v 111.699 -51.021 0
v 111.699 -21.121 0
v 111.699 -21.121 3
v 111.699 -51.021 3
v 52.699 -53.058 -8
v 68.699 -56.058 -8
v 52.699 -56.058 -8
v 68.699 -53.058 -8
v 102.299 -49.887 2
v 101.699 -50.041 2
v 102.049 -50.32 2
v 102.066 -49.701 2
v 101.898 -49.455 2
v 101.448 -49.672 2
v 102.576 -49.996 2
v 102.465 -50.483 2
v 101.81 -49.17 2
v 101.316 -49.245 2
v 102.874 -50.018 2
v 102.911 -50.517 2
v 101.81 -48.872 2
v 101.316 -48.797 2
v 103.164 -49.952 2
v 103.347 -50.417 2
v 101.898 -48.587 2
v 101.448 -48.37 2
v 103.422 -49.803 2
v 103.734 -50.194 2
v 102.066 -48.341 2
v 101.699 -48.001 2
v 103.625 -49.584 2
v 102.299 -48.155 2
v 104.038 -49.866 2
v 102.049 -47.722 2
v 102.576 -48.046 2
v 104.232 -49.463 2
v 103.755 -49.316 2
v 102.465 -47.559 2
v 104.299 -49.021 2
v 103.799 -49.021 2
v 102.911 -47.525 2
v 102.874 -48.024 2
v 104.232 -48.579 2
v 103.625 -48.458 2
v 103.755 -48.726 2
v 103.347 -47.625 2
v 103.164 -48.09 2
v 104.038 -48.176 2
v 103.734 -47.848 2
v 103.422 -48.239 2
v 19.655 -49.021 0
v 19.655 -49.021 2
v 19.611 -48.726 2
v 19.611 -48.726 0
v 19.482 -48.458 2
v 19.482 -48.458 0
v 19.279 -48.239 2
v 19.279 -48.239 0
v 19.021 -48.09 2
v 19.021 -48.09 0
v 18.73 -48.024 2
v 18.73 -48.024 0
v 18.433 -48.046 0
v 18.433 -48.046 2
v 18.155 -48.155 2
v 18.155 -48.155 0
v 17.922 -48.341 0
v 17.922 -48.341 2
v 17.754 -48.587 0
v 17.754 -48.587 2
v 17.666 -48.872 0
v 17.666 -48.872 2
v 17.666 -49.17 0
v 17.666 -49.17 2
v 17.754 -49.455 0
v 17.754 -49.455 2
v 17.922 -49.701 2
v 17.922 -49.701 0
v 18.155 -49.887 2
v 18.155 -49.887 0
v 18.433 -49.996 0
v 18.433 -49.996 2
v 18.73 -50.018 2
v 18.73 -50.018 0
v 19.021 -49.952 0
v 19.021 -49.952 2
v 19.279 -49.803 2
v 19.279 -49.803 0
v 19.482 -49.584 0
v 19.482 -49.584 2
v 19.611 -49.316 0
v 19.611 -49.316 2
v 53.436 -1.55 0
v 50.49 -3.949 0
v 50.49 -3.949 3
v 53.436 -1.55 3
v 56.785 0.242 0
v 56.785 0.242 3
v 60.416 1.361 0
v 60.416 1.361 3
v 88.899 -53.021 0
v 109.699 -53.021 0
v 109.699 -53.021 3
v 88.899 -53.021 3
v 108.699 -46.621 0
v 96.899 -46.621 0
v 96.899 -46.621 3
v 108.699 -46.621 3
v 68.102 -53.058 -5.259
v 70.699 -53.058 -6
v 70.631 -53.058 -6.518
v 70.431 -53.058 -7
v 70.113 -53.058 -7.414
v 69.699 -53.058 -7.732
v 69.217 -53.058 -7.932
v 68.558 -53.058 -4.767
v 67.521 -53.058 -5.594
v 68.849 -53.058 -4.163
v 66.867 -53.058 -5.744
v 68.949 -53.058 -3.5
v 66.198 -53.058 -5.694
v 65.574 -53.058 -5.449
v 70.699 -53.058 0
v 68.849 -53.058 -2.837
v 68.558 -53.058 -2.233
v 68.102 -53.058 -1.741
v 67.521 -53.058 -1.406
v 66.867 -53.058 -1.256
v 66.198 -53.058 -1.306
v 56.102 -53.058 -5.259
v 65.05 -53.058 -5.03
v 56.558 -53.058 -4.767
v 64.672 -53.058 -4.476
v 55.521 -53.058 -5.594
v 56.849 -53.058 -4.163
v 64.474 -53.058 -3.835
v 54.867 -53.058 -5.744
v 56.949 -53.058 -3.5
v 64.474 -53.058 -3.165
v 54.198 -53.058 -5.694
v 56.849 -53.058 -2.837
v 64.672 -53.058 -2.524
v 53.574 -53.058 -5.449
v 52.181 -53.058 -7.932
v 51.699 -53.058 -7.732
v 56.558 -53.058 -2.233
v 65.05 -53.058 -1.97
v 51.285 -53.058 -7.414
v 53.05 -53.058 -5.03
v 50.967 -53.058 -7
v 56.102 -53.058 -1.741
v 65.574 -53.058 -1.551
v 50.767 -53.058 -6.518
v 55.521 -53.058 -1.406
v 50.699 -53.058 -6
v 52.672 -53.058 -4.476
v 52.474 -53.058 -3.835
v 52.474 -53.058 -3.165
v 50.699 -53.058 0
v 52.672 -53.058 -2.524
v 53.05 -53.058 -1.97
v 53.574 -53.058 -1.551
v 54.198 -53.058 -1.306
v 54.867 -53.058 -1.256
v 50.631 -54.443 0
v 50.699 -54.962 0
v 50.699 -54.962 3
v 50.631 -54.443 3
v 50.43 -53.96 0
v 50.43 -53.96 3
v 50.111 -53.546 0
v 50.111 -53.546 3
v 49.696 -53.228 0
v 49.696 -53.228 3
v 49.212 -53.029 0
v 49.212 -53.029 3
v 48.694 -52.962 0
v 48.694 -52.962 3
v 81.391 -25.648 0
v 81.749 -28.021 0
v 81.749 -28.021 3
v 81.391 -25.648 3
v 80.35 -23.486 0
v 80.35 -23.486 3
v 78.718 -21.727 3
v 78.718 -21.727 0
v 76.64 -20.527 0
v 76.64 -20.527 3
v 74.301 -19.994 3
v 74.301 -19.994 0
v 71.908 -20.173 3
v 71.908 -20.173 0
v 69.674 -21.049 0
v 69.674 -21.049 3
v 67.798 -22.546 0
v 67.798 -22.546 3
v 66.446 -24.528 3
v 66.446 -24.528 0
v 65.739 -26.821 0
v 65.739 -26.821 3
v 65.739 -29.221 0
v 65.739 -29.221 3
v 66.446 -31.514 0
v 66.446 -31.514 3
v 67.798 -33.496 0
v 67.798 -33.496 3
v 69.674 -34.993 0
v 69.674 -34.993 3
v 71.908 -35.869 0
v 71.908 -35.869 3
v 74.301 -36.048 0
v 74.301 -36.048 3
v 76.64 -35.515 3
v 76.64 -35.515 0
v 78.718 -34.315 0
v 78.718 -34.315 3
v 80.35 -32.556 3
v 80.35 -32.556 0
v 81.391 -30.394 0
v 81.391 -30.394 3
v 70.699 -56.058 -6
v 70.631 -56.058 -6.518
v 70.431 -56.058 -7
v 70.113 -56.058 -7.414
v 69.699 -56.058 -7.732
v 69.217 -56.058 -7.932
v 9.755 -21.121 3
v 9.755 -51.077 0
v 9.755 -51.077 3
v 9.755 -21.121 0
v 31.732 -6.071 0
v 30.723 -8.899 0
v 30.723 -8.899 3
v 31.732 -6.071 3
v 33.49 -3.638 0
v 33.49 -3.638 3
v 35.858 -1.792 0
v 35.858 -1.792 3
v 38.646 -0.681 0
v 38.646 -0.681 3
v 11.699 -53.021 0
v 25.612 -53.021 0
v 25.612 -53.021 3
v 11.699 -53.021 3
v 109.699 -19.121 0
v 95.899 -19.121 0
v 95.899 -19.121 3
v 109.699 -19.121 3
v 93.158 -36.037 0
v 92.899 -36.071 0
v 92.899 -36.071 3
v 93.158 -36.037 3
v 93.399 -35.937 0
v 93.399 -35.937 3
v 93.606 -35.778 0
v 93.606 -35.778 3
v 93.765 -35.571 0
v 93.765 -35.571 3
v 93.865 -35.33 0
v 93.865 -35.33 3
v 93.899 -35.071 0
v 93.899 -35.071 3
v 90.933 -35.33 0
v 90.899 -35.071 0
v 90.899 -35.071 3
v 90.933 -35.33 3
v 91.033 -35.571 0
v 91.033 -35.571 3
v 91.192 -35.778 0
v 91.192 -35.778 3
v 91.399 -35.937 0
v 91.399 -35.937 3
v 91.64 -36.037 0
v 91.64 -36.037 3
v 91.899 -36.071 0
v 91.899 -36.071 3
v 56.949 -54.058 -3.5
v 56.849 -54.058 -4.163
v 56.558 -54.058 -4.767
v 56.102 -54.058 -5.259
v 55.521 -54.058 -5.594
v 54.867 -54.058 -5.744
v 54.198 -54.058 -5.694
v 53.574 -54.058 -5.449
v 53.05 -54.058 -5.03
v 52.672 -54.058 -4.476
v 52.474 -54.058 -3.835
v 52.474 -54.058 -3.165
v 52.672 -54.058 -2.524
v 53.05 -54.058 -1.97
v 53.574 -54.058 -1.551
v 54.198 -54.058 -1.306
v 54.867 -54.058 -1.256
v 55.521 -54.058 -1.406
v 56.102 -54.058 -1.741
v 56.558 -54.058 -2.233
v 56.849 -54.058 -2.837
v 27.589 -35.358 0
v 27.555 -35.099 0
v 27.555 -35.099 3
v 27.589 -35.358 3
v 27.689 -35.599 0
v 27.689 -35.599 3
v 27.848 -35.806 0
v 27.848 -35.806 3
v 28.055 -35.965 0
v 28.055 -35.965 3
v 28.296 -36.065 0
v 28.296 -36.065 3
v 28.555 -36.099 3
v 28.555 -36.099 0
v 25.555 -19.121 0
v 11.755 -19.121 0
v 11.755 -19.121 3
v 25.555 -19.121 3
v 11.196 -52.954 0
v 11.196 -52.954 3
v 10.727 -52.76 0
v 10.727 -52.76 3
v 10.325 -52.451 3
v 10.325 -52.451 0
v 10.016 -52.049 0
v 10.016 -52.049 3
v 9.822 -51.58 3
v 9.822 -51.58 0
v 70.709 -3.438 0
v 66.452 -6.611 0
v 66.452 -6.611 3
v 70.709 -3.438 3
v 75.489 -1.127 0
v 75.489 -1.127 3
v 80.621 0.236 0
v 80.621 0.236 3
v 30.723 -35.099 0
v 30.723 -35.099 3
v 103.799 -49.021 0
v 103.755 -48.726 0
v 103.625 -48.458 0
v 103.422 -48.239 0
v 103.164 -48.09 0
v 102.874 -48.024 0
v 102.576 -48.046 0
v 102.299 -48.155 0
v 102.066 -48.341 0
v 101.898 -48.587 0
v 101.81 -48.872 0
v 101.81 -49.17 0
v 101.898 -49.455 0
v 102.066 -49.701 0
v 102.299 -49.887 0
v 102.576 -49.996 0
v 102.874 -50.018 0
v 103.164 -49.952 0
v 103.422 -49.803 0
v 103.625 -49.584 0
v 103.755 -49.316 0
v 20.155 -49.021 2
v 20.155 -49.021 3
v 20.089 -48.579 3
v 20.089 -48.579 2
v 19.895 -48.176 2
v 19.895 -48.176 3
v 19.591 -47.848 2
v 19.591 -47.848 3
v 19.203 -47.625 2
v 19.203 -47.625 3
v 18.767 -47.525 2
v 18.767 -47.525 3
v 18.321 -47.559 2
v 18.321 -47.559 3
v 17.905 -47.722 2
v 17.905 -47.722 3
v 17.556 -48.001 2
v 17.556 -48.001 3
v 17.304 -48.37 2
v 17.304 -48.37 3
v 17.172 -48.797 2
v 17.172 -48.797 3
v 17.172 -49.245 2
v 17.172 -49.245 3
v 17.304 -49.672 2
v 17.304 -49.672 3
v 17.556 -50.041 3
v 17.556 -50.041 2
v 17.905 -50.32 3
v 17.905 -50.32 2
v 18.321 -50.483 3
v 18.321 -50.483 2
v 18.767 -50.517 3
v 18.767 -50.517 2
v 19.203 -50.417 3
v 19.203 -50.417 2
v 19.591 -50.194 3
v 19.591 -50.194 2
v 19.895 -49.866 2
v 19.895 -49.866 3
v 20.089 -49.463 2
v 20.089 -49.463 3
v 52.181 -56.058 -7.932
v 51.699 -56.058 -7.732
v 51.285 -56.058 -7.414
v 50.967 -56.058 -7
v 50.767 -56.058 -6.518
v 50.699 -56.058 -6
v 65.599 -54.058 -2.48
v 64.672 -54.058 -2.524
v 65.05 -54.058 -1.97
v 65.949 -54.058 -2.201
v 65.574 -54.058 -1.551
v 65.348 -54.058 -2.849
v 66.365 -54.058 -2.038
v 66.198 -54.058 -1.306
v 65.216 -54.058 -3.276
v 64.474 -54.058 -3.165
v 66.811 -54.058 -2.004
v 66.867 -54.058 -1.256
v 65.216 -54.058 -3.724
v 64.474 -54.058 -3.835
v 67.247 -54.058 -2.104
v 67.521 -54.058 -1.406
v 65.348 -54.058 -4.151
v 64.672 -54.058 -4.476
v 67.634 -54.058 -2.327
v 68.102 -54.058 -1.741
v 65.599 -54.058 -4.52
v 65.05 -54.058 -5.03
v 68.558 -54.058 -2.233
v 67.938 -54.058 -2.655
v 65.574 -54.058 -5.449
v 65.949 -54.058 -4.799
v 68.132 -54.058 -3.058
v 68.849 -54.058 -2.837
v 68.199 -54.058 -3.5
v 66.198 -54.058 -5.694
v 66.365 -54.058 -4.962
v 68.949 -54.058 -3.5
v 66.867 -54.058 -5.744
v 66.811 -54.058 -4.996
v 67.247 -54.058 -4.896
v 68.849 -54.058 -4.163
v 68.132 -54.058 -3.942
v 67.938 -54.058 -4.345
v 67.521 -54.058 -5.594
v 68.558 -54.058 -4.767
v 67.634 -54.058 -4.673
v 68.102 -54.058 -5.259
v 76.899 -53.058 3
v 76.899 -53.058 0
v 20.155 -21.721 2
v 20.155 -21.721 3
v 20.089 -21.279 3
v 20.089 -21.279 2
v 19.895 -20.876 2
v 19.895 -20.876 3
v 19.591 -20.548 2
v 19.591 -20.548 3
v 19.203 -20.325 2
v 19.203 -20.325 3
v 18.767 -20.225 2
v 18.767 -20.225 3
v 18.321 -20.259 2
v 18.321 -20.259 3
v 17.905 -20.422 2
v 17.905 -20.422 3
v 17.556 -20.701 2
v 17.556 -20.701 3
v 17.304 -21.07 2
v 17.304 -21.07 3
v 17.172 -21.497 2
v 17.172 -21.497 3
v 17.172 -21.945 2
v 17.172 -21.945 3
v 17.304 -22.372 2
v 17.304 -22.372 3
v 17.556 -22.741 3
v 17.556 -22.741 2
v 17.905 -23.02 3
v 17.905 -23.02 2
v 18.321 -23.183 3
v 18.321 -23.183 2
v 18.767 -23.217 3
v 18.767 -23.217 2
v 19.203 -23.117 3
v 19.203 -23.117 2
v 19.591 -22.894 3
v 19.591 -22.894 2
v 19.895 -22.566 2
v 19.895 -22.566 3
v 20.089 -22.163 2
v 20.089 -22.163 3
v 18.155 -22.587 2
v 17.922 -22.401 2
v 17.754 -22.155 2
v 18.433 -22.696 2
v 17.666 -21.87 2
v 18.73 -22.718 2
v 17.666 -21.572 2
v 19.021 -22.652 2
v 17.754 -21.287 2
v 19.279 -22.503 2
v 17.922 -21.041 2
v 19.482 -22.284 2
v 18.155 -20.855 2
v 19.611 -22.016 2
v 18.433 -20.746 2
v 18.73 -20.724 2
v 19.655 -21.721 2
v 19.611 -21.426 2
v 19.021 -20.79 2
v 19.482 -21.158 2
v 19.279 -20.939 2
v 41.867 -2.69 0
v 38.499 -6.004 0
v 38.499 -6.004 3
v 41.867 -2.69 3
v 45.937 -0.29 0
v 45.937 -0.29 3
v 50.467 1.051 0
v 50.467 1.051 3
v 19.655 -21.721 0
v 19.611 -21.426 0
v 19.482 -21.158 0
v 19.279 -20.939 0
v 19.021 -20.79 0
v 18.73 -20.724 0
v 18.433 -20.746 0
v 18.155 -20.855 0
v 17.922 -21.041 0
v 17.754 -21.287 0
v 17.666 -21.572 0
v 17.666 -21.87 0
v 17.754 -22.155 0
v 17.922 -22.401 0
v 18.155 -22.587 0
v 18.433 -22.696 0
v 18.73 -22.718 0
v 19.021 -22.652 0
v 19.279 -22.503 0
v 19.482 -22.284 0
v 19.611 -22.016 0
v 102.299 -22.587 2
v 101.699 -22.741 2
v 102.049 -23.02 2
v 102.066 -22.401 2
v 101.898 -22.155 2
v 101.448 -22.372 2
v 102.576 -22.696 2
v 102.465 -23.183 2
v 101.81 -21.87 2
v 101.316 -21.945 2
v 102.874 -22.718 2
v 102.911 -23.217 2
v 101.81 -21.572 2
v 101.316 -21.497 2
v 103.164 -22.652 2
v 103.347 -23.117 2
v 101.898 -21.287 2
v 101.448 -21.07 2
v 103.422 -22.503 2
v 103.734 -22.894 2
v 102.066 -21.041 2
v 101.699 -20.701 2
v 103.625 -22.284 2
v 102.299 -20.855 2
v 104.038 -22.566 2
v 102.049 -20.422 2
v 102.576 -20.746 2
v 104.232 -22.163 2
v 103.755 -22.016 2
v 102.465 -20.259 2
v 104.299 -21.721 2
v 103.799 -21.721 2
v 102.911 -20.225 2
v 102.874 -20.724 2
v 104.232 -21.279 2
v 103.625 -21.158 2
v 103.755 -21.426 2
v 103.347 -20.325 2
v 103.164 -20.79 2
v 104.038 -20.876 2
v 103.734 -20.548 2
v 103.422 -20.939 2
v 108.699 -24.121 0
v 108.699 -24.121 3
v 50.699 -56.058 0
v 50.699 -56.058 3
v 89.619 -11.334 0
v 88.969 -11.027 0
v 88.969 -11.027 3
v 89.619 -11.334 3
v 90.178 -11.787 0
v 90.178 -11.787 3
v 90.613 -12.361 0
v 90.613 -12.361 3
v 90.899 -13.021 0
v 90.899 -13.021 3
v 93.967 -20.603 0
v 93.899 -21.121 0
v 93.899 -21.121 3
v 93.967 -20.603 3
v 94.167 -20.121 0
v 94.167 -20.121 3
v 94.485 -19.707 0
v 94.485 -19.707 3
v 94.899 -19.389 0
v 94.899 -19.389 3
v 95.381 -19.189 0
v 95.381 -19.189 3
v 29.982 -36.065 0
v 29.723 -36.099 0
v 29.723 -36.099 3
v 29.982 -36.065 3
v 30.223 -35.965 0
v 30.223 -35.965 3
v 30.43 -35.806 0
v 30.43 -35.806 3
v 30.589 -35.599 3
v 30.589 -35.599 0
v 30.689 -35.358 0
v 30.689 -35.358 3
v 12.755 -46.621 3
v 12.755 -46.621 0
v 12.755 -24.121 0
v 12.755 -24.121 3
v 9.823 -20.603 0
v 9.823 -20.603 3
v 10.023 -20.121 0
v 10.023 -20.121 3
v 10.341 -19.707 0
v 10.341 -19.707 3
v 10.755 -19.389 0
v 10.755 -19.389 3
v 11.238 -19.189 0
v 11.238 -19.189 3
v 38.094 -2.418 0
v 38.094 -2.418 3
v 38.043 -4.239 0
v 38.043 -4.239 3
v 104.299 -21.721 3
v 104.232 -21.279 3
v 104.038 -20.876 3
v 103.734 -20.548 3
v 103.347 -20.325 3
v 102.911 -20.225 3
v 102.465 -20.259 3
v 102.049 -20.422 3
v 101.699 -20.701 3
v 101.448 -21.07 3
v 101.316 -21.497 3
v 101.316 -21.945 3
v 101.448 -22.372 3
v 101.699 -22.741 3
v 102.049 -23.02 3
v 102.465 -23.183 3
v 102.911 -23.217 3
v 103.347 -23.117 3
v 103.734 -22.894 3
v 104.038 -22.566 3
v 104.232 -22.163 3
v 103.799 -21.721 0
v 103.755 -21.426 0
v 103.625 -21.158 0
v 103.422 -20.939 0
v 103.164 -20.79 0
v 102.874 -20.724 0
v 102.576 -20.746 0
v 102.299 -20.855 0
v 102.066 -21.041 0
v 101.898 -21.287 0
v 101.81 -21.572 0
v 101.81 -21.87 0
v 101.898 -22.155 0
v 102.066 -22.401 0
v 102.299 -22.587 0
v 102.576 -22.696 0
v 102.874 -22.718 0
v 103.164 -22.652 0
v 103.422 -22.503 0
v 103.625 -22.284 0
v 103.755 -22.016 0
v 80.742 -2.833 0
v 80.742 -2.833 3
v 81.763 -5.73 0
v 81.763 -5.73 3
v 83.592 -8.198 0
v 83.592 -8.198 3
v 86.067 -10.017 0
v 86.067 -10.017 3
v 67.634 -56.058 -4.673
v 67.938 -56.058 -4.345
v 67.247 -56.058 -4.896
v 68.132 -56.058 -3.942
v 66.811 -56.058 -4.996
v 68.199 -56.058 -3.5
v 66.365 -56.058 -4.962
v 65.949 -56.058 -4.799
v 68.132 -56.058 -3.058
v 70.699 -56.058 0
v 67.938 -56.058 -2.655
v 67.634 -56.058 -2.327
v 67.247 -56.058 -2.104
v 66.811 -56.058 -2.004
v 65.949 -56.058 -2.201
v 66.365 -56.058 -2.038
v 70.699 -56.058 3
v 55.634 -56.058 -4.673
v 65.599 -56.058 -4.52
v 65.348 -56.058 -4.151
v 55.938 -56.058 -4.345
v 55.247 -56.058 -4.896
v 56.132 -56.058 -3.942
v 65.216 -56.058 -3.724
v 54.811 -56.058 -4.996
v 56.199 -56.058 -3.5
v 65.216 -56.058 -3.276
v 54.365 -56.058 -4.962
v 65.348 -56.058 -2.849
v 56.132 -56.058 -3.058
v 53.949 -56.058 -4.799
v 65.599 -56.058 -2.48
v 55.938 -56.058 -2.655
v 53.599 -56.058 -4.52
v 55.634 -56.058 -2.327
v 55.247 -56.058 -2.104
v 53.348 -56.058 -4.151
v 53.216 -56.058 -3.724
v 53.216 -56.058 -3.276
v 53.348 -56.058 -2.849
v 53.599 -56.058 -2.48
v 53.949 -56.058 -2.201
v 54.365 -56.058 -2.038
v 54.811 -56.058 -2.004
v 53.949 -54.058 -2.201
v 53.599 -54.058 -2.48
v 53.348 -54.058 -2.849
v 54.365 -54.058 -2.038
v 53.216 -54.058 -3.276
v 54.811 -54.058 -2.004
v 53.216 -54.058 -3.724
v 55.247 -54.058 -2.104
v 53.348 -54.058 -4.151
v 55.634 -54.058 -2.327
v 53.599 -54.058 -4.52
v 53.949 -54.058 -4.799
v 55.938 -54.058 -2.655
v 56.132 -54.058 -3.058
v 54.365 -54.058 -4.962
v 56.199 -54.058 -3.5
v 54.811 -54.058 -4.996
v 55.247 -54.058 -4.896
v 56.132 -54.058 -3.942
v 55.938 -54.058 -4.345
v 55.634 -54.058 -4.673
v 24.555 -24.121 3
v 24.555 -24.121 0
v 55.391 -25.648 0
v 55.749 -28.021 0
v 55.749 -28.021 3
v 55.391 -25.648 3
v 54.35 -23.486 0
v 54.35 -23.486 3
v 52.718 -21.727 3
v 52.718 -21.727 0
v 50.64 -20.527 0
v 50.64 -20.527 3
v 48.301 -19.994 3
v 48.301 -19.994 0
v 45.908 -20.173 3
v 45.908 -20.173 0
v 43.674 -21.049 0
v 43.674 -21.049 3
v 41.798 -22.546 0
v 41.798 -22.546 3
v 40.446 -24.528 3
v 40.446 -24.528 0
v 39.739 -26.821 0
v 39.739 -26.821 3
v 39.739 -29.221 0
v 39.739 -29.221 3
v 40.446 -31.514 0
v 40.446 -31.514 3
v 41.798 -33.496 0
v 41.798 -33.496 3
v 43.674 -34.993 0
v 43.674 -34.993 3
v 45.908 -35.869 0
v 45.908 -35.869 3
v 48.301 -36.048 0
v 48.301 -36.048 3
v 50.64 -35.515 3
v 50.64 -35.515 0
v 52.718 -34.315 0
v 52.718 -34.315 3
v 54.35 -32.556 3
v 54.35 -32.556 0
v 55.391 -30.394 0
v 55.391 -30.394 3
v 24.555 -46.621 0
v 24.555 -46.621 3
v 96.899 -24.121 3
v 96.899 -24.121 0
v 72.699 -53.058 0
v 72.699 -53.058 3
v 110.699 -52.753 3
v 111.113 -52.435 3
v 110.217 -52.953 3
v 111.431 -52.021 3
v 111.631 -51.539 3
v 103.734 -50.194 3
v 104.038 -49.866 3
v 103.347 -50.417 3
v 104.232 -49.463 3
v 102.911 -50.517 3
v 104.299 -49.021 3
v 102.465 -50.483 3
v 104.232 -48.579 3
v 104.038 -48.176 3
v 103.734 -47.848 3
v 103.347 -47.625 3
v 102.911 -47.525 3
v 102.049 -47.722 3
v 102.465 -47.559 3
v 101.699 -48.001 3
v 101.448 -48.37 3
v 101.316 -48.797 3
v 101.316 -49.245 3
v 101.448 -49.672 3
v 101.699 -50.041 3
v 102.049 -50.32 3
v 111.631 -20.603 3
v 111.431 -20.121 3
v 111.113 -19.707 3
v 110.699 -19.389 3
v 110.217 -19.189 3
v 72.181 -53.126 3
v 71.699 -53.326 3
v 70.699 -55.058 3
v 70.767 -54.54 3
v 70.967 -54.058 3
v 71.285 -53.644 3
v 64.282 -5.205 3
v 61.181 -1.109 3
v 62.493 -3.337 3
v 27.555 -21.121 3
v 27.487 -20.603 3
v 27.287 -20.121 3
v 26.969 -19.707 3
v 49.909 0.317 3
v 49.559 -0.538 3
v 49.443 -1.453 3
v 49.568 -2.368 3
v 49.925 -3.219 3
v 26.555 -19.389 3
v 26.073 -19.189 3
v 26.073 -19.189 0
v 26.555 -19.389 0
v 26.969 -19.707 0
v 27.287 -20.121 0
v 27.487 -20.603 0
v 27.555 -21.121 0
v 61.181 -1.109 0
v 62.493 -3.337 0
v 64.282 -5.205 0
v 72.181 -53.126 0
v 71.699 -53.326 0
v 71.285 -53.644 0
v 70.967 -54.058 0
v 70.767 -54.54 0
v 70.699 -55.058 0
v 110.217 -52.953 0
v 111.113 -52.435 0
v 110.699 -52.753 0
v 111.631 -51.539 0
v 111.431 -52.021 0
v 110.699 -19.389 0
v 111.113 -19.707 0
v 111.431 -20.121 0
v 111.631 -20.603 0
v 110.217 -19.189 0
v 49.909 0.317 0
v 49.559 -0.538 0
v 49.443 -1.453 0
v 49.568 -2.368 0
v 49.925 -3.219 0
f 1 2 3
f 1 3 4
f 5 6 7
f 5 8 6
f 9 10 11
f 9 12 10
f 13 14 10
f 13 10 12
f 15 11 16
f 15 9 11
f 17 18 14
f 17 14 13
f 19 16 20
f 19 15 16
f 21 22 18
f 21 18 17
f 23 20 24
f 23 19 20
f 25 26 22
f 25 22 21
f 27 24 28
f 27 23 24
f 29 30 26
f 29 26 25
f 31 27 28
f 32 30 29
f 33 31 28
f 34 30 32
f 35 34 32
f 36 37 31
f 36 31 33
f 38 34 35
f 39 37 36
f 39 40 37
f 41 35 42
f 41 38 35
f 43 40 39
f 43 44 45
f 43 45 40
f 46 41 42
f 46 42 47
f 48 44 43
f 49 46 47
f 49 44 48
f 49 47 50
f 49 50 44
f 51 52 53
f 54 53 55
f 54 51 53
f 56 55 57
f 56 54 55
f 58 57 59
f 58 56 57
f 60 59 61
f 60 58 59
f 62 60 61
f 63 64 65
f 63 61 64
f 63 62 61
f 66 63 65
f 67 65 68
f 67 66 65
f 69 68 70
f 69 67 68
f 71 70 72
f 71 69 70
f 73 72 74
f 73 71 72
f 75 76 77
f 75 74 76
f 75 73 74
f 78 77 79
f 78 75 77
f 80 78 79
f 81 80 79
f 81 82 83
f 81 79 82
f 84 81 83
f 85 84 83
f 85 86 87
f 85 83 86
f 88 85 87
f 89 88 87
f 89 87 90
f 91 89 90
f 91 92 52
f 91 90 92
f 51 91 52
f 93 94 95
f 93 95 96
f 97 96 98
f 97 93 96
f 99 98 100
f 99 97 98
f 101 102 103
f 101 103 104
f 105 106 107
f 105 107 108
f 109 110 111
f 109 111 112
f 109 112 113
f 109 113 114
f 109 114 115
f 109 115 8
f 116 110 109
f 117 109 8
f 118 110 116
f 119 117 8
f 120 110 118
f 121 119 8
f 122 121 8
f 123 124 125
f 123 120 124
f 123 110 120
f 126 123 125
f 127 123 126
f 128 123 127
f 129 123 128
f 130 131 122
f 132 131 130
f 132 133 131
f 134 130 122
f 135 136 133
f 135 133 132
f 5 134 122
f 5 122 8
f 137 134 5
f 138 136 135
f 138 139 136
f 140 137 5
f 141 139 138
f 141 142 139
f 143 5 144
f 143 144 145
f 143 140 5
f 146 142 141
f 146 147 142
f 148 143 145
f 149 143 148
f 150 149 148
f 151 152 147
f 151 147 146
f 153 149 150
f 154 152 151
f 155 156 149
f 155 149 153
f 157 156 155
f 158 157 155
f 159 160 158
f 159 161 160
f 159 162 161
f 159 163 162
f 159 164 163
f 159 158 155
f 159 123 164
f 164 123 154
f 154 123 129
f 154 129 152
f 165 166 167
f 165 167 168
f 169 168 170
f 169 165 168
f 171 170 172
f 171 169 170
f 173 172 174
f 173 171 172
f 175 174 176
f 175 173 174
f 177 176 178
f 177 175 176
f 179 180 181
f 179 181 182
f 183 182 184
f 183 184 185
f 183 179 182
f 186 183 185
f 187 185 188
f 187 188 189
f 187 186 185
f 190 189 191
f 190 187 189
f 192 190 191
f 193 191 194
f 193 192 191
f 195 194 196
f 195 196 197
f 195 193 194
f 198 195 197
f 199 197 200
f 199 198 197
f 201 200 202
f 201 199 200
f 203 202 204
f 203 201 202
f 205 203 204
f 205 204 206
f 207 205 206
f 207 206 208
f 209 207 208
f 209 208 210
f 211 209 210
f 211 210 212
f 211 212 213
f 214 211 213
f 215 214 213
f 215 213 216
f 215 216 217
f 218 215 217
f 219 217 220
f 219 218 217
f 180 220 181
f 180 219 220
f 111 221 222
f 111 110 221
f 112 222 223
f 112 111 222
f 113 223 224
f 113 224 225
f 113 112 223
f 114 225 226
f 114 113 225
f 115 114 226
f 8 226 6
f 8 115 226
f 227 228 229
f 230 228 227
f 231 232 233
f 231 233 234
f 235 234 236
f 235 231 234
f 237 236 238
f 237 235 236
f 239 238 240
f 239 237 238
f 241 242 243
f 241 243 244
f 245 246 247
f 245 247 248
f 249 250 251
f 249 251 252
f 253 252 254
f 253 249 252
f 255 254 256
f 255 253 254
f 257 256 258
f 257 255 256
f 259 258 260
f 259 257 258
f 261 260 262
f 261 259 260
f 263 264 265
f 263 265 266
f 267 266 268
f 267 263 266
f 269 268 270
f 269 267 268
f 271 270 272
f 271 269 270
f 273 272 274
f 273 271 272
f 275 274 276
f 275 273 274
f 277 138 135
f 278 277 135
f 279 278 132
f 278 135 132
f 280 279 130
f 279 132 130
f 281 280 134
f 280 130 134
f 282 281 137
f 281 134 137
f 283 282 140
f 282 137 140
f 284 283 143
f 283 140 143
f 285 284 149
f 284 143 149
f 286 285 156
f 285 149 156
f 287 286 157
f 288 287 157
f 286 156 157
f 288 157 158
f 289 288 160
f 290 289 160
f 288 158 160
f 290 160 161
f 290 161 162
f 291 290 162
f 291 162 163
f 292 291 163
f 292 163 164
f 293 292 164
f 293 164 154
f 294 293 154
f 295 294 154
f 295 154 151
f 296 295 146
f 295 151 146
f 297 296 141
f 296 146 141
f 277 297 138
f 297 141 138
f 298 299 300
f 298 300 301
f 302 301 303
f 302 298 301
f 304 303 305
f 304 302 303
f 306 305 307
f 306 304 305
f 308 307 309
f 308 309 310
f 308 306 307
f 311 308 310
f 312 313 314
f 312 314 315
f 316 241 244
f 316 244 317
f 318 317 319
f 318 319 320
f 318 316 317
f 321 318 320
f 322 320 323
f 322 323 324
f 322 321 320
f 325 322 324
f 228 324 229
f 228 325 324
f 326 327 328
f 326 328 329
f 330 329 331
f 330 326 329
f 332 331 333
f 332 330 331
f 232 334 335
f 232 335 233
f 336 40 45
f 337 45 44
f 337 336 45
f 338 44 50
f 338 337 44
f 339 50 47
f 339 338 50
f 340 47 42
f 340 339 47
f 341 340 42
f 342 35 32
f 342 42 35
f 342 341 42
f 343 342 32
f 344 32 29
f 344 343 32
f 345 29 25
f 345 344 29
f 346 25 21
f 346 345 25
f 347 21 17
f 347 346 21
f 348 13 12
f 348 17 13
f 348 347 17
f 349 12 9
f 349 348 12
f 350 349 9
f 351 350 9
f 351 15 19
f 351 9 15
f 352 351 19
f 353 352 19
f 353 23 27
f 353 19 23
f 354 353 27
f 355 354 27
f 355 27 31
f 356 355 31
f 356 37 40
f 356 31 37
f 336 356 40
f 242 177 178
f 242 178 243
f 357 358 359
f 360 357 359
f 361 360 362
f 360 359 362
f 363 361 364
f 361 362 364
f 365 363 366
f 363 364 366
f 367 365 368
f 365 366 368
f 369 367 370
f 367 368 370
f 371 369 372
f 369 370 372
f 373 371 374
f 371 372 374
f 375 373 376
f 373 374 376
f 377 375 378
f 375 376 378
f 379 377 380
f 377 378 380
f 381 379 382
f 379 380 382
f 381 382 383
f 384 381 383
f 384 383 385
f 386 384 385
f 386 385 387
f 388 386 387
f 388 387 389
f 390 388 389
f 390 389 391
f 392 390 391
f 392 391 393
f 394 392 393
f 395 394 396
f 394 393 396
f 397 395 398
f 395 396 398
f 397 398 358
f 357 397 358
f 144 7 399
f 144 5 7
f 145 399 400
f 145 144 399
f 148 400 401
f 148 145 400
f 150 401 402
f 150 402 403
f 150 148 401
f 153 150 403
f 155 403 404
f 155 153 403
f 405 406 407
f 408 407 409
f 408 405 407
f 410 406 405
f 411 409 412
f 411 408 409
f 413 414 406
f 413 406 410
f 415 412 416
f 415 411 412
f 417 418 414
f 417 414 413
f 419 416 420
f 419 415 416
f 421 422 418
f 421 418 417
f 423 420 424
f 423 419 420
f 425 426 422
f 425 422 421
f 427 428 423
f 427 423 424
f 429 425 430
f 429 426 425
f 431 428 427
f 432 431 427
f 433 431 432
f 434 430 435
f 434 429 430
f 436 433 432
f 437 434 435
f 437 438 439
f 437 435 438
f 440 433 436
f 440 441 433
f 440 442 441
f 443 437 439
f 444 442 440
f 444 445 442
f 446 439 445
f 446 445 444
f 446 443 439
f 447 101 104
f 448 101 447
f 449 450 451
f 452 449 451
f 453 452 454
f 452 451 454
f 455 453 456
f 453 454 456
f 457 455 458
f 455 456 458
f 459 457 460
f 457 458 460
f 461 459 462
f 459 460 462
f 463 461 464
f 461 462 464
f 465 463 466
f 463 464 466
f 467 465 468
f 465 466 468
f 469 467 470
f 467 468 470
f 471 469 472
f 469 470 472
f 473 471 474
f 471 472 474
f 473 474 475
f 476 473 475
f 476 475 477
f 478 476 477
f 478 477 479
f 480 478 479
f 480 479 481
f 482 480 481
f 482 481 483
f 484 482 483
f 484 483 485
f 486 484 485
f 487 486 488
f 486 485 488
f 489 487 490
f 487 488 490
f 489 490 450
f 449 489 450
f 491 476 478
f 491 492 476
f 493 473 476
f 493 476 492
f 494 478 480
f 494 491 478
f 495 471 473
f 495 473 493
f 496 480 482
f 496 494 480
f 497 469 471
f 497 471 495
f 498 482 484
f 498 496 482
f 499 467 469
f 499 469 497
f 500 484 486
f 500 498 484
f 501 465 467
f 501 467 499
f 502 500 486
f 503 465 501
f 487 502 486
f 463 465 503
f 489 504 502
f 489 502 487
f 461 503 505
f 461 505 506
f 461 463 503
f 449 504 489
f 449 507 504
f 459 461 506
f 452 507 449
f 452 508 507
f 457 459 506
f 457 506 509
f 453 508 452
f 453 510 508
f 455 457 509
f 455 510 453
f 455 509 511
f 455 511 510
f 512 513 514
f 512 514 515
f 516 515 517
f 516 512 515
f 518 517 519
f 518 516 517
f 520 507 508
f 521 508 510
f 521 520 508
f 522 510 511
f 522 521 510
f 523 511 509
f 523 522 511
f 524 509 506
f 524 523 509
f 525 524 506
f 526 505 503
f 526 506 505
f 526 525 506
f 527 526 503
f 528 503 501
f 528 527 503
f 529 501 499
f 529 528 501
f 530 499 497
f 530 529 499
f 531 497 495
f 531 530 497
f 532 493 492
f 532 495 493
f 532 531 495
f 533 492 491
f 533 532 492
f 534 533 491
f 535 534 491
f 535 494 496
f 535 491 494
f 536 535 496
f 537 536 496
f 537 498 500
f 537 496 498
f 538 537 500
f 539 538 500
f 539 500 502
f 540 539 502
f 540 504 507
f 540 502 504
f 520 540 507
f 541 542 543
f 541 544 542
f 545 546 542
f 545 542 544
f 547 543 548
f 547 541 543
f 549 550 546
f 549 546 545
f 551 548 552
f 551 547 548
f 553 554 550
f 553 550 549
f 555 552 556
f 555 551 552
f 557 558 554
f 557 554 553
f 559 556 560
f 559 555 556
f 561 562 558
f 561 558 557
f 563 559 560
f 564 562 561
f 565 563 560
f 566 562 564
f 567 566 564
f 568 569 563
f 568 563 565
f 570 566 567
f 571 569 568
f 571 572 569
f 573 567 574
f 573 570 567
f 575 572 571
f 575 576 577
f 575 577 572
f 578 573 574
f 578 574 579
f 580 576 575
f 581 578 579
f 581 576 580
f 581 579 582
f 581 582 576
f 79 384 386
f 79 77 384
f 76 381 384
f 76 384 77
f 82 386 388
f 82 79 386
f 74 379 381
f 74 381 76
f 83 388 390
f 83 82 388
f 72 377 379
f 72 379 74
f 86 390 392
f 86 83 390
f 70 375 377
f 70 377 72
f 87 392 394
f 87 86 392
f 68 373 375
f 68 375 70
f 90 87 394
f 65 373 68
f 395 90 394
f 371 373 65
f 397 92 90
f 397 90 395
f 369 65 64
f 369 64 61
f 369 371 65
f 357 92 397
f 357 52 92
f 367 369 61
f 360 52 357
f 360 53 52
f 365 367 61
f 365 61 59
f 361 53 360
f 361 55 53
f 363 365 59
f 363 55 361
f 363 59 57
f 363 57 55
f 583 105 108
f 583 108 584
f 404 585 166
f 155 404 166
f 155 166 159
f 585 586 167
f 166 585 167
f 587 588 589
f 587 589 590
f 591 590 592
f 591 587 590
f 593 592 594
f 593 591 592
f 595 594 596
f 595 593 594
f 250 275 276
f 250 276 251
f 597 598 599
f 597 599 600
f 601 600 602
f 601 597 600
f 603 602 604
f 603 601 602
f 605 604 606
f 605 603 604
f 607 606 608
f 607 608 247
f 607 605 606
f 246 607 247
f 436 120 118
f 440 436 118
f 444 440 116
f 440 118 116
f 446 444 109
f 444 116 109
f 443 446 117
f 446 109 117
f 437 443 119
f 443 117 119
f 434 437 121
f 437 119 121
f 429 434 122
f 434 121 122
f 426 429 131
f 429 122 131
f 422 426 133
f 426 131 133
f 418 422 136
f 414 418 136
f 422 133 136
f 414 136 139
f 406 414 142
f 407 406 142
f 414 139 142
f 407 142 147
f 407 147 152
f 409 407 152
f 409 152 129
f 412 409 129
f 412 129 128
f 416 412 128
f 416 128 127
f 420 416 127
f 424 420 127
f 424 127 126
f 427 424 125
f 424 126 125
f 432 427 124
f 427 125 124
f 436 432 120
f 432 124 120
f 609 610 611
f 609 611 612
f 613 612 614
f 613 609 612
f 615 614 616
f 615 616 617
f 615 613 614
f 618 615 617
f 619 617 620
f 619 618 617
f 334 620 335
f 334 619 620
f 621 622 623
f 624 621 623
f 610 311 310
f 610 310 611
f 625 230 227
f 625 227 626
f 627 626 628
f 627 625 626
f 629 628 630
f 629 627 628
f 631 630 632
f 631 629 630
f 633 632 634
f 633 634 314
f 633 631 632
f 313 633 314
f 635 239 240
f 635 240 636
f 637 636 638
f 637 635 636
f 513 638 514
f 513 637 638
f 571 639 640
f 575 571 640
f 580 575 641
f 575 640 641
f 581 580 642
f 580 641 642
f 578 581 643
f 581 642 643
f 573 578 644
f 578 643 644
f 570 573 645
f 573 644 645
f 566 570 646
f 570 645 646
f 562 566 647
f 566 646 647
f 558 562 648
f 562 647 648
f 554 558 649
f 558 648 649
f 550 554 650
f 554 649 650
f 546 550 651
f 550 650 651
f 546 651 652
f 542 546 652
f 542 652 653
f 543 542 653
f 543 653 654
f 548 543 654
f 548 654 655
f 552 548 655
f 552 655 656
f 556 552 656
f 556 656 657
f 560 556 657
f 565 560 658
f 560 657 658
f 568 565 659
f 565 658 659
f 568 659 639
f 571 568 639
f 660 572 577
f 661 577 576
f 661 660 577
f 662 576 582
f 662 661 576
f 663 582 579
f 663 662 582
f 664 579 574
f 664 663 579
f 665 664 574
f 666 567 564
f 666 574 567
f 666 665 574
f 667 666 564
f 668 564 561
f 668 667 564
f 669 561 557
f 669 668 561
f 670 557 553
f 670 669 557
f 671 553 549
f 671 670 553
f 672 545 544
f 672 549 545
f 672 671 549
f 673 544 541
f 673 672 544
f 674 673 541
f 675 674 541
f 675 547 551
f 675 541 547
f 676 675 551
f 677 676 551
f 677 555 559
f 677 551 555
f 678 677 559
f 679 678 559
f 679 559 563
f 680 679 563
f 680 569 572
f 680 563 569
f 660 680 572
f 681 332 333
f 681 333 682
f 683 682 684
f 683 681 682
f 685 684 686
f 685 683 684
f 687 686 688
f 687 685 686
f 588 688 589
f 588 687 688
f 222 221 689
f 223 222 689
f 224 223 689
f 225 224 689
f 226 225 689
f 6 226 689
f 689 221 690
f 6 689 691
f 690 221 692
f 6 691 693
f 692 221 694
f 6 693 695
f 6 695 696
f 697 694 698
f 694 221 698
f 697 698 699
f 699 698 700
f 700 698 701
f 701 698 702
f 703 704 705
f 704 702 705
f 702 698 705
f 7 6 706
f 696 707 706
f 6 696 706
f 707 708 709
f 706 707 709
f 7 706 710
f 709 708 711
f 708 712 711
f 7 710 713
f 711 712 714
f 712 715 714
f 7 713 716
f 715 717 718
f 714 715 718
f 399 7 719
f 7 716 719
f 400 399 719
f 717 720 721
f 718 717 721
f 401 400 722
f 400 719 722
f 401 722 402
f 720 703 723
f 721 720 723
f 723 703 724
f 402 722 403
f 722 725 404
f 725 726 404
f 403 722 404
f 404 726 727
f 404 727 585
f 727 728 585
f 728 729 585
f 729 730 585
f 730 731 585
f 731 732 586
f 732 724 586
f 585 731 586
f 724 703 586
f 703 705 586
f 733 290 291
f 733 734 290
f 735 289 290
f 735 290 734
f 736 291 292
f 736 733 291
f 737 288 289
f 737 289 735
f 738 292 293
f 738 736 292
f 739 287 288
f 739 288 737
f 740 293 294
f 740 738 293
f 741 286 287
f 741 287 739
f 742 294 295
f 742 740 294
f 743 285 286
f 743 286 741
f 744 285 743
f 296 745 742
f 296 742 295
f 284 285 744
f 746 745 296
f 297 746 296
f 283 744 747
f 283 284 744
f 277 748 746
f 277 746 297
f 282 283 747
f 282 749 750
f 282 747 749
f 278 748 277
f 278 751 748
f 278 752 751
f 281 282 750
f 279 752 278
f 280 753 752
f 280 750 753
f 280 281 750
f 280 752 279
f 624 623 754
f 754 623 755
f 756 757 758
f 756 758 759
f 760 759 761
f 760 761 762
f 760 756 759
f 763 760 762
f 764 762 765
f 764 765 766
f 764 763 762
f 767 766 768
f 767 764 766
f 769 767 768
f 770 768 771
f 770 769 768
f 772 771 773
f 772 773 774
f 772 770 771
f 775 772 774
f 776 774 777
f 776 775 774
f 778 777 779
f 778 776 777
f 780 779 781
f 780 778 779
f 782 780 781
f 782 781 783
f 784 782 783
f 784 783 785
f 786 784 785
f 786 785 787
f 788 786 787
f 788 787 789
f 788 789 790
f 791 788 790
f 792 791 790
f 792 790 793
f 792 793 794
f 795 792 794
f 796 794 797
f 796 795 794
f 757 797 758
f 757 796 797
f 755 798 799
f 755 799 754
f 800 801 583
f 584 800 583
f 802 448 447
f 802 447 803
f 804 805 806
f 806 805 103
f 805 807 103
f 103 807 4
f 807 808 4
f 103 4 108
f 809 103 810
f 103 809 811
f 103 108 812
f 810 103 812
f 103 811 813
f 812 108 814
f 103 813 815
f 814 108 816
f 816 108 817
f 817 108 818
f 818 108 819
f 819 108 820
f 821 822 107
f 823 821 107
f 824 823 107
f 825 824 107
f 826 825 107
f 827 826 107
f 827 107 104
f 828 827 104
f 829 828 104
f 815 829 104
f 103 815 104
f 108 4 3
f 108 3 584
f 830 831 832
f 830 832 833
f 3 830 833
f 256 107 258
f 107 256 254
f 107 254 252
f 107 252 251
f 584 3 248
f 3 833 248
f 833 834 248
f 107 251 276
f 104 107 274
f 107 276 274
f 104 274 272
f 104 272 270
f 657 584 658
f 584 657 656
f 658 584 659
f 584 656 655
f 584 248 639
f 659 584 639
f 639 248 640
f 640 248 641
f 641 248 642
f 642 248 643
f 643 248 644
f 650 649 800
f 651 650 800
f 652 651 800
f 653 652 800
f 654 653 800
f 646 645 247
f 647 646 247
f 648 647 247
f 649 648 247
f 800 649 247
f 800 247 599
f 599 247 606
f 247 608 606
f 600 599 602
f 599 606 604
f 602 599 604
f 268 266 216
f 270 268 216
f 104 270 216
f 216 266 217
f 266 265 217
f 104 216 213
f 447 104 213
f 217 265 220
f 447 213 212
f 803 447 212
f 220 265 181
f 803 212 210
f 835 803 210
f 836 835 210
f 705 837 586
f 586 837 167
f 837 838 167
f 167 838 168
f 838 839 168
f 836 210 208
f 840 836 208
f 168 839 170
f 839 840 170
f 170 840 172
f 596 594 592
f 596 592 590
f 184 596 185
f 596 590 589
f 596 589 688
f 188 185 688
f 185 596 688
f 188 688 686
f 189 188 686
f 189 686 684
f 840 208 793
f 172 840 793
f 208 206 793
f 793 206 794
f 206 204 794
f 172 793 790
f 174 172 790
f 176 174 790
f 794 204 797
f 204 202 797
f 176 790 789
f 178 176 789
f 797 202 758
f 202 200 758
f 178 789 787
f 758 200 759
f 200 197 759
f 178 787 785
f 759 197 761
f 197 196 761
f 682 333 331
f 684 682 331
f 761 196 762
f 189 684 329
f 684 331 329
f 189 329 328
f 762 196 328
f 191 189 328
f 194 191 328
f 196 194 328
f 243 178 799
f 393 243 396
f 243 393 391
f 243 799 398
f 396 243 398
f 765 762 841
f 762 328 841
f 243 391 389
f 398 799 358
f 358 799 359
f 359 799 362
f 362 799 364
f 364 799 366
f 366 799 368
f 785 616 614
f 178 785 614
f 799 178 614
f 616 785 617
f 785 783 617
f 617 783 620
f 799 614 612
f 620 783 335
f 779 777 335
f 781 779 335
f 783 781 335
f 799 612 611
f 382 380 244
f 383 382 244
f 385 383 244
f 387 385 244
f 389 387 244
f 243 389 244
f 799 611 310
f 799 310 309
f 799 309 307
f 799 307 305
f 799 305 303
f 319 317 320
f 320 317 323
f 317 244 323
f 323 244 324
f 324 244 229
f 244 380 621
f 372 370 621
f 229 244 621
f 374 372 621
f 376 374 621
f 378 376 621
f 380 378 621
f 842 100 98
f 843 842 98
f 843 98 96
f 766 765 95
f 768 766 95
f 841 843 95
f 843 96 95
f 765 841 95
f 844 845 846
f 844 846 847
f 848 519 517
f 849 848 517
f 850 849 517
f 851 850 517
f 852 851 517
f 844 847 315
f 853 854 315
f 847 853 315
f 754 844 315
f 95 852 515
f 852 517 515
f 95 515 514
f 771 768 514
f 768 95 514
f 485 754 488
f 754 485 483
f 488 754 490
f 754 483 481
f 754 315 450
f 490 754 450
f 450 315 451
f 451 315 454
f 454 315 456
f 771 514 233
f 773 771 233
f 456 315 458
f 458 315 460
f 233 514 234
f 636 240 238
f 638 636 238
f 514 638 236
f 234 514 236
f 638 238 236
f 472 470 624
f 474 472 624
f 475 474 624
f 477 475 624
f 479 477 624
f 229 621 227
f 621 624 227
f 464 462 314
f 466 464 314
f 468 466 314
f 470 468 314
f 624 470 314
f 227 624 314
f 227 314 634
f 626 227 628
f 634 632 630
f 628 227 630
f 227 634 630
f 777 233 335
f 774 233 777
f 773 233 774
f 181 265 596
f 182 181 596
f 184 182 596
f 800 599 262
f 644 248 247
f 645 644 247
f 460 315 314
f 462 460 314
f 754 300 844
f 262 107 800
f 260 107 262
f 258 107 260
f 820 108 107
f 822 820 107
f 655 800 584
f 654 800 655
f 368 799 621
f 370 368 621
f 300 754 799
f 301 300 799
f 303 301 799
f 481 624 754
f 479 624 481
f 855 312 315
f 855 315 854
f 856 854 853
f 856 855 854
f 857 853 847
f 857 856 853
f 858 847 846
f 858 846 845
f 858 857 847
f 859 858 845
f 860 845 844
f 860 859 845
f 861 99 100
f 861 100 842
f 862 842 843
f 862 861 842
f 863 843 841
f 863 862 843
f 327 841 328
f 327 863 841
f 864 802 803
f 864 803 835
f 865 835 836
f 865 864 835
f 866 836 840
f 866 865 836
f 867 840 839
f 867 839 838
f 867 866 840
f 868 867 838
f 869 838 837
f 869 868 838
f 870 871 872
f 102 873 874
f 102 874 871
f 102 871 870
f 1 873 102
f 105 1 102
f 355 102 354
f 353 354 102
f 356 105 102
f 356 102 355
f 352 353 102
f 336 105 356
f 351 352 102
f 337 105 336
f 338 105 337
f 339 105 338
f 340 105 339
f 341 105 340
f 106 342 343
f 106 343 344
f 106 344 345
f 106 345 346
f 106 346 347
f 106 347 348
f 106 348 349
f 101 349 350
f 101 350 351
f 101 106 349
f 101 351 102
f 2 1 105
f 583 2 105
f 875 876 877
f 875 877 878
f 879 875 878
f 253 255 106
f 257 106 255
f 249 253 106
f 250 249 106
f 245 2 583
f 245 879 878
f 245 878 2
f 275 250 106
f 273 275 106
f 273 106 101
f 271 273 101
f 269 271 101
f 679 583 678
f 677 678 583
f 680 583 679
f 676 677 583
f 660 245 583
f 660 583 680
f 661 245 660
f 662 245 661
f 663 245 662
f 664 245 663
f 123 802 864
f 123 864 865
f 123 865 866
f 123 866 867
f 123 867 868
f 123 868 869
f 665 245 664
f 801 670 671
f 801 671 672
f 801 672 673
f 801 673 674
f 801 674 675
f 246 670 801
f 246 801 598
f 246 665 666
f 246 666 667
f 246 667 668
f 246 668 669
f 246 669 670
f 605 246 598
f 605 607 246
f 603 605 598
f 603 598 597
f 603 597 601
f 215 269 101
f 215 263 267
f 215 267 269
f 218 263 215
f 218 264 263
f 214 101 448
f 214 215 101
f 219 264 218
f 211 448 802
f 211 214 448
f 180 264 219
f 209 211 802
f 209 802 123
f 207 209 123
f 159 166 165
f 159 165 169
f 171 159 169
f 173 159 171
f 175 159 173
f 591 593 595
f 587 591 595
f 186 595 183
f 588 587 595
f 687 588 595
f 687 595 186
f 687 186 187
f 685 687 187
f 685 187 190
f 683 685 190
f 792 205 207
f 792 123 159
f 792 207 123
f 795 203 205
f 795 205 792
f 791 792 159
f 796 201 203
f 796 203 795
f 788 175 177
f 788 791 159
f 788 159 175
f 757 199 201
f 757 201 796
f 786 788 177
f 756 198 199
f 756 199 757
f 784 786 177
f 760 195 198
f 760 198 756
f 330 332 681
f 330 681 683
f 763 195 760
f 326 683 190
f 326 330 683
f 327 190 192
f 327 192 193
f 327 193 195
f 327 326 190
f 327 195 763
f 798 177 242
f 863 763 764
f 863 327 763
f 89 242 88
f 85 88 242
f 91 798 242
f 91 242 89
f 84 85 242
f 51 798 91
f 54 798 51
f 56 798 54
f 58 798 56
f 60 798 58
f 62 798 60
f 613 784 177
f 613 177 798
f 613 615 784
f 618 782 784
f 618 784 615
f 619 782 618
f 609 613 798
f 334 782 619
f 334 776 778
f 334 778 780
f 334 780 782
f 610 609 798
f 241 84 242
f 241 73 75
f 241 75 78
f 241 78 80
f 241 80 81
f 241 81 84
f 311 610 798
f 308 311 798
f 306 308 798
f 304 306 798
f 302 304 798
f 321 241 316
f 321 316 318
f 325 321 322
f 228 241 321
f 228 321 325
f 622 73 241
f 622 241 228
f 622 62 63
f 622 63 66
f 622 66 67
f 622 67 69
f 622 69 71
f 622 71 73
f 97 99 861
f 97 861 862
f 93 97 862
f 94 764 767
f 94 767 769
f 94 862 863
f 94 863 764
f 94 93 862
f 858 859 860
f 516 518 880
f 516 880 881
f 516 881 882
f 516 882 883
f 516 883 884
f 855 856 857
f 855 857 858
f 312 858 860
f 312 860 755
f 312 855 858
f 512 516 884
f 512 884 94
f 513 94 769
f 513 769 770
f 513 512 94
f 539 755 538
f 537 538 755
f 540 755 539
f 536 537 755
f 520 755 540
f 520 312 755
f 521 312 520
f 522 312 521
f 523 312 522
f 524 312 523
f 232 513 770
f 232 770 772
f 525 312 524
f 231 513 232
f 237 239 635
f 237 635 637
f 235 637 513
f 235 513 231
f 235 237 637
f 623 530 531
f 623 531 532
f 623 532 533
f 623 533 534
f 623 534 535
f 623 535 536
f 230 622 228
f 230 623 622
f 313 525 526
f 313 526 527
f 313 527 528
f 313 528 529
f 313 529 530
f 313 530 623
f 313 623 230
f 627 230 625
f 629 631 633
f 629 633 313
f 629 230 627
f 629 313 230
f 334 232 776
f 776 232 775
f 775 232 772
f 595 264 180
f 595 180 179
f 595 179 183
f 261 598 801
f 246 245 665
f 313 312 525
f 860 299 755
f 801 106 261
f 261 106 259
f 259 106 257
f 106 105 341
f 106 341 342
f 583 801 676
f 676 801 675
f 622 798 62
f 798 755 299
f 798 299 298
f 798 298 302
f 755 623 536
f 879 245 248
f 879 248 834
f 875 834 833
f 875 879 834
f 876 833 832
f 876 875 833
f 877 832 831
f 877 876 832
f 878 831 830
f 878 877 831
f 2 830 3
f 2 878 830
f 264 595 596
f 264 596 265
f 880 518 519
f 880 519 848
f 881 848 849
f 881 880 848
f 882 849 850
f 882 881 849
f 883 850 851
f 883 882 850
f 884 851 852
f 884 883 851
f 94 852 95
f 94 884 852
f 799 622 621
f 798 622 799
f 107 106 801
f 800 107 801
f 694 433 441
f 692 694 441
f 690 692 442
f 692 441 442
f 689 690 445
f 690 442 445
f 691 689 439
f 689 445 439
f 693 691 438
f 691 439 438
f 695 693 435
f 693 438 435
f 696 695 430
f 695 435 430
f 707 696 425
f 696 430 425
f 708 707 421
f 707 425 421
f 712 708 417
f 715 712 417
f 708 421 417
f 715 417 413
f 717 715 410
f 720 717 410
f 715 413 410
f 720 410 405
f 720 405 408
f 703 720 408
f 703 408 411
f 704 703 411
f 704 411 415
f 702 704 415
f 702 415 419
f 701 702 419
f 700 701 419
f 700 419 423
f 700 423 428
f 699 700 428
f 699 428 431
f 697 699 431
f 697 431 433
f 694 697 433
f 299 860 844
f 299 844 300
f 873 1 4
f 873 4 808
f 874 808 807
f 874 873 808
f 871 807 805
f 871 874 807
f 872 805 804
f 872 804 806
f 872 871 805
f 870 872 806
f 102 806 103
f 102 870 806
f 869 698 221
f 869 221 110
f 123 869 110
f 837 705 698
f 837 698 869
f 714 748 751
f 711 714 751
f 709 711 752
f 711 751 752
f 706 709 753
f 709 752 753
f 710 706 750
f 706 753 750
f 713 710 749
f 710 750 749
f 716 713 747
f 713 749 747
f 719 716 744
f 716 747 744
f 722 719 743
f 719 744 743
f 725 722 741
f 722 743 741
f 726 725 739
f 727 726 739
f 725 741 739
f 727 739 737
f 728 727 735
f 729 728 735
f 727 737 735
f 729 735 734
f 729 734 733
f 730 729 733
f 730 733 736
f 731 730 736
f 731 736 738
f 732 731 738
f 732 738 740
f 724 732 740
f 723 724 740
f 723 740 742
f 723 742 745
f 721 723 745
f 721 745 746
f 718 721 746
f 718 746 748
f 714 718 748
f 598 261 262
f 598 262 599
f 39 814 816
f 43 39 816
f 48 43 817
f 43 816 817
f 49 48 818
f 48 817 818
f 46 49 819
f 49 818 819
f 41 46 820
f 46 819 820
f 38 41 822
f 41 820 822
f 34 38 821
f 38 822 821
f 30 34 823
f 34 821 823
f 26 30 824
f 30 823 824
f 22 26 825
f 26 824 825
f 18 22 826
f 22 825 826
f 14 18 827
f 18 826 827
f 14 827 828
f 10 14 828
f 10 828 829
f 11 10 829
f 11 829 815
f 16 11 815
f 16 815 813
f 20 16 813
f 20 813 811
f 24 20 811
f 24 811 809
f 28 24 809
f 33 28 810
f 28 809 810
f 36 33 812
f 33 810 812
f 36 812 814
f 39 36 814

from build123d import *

# Parameters (mm, degrees)
MODEL_R                 = 8.05
MODEL_R_2               = 1
MODEL_W                 = 11.8
MODEL_H                 = 22.5
SALIENTE_EXTRUIR1_DEPTH = 3
CROQUIS1_W              = 19.999999999
CROQUIS1_H              = 3
SALIENTE_EXTRUIR2_DEPTH = 8
CROQUIS2_R              = 1.5
CORTAR_EXTRUIR1_DEPTH   = 3
REDONDEO2_R             = 2
CROQUIS3_R              = 1.5
CORTAR_EXTRUIR2_DEPTH   = 1
CROQUIS4_R              = 2.25
CORTAR_EXTRUIR3_DEPTH   = 1


with BuildPart() as part:
    # Model → Saliente-Extruir1 (new body)
    with BuildSketch(Plane.XY):
        with BuildLine():
            Line((28.555278924, -36.098945331), (29.722974743, -36.098945331))
            ThreePointArc((29.722974743, -36.098945331), (30.430081524, -35.806052112), (30.722974743, -35.098945331))
            Line((30.722974743, -35.098945331), (30.722974743, -8.898603015))
            ThreePointArc((30.722974743, -8.898603015), (33.490026108, -3.637946704), (38.646410135, -0.681127156))
            ThreePointArc((38.646410135, -0.681127156), (38.00468524, -3.326803395), (38.499385848, -6.00386987))
            ThreePointArc((38.499385848, -6.00386987), (43.828182769, -1.365184752), (50.466982875, 1.051385009))
            ThreePointArc((50.466982875, 1.051385009), (49.442986911, -1.453363029), (50.490036744, -3.948561843))
            ThreePointArc((50.490036744, -3.948561843), (55.067544133, -0.573430734), (60.41559095, 1.361376528))
            ThreePointArc((60.41559095, 1.361376528), (62.493005652, -3.33729886), (66.452413363, -6.610873791))
            ThreePointArc((66.452413363, -6.610873791), (73.044296854, -2.168793623), (80.620547187, 0.236499516))
            ThreePointArc((80.620547187, 0.236499516), (82.584961535, -7.032813492), (88.968686823, -11.026544426))
            ThreePointArc((88.968686823, -11.026544426), (90.178347555, -11.787115236), (90.898959582, -13.020997464))
            Line((90.898959582, -13.020997464), (90.898959582, -35.070997464))
            ThreePointArc((90.898959582, -35.070997464), (91.191852801, -35.778104245), (91.898959582, -36.070997464))
            Line((91.898959582, -36.070997464), (92.898959582, -36.070997464))
            ThreePointArc((92.898959582, -36.070997464), (93.606066364, -35.778104245), (93.898959582, -35.070997464))
            Line((93.898959582, -35.070997464), (93.898959582, -21.120997464))
            ThreePointArc((93.898959582, -21.120997464), (94.48474602, -19.706783901), (95.898959582, -19.120997464))
            Line((95.898959582, -19.120997464), (109.698959582, -19.120997464))
            ThreePointArc((109.698959582, -19.120997464), (111.113173145, -19.706783901), (111.698959582, -21.120997464))
            Line((111.698959582, -21.120997464), (111.698959582, -51.020997464))
            ThreePointArc((111.698959582, -51.020997464), (111.113173145, -52.435211026), (109.698959582, -53.020997464))
            Line((109.698959582, -53.020997464), (88.898959583, -53.020997464))
            Line((88.898959583, -53.020997464), (76.898959583, -53.057975795))
            Line((76.898959583, -53.057975795), (72.698959583, -53.057975795))
            ThreePointArc((72.698959583, -53.057975795), (71.28474602, -53.643762233), (70.698959583, -55.057975795))
            Line((70.698959583, -55.057975795), (70.698959583, -56.057975795))
            Line((70.698959583, -56.057975795), (50.698959583, -56.057975795))
            Line((50.698959583, -56.057975795), (50.698959583, -54.961647582))
            ThreePointArc((50.698959583, -54.961647582), (50.111367037, -53.545630215), (48.6938544, -52.961654097))
            Line((48.6938544, -52.961654097), (25.611598266, -53.020573857))
            Line((25.611598266, -53.020573857), (11.698959583, -53.020573857))
            ThreePointArc((11.698959583, -53.020573857), (10.324569809, -52.451282972), (9.755278924, -51.076893199))
            Line((9.755278924, -51.076893199), (9.755278924, -21.120997464))
            ThreePointArc((9.755278924, -21.120997464), (10.341065362, -19.706783901), (11.755278924, -19.120997464))
            Line((11.755278924, -19.120997464), (25.555278924, -19.120997464))
            ThreePointArc((25.555278924, -19.120997464), (26.969492487, -19.706783901), (27.555278924, -21.120997464))
            Line((27.555278924, -21.120997464), (27.555278924, -35.098945331))
            ThreePointArc((27.555278924, -35.098945331), (27.848172143, -35.806052112), (28.555278924, -36.098945331))
        make_face()
        with Locations((73.698959582, -28.020997464)):
            Circle(MODEL_R, mode=Mode.SUBTRACT)
        with Locations((47.698959583, -28.020997464)):
            Circle(MODEL_R, mode=Mode.SUBTRACT)
        with Locations((102.798959583, -21.720997464)):
            Circle(MODEL_R_2, mode=Mode.SUBTRACT)
        with Locations((102.798959583, -49.020997464)):
            Circle(MODEL_R_2, mode=Mode.SUBTRACT)
        with Locations((18.655278924, -49.020997464)):
            Circle(MODEL_R_2, mode=Mode.SUBTRACT)
        with Locations((18.655278924, -21.720997464)):
            Circle(MODEL_R_2, mode=Mode.SUBTRACT)
        with Locations((102.798959582, -35.370997464)):
            Rectangle(MODEL_W, MODEL_H, mode=Mode.SUBTRACT)
        with Locations((18.655278924, -35.370997464)):
            Rectangle(MODEL_W, MODEL_H, mode=Mode.SUBTRACT)
    extrude(amount=SALIENTE_EXTRUIR1_DEPTH)

    # Croquis1 → Saliente-Extruir2 (add)
    with BuildSketch(Plane(origin=(0, 0, 0), x_dir=(-1, 0, 0), z_dir=(0, 0, -1))):
        with Locations((-60.698959583, -54.557975795)):
            Rectangle(CROQUIS1_W, CROQUIS1_H)
    extrude(amount=SALIENTE_EXTRUIR2_DEPTH)

    # Croquis2 → Cortar-Extruir1 (cut)
    with BuildSketch(Plane(origin=(0, -53.057975795, 0), x_dir=(1, 0, 0), z_dir=(0, 1, 0))):
        with Locations((66.698959583, 3.5)):
            Circle(CROQUIS2_R)
        with Locations((54.698959583, 3.5)):
            Circle(CROQUIS2_R)
    extrude(amount=-CORTAR_EXTRUIR1_DEPTH, mode=Mode.SUBTRACT)

    # Redondeo2
    redondeo2_edges = [part.edges().sort_by_distance(p)[0] for p in [
        (50.698959583, -54.557975795, -8),
        (70.698959583, -54.557975795, -8),
    ]]
    fillet(redondeo2_edges, radius=REDONDEO2_R)

    # Croquis3 → Cortar-Extruir2 (cut)
    with BuildSketch(Plane.XY.offset(3)):
        with Locations((18.655278924, -21.720997464)):
            Circle(CROQUIS3_R)
        with Locations((18.655278924, -49.020997464)):
            Circle(CROQUIS3_R)
        with Locations((102.798959583, -49.020997464)):
            Circle(CROQUIS3_R)
        with Locations((102.798959583, -21.720997464)):
            Circle(CROQUIS3_R)
    extrude(amount=-CORTAR_EXTRUIR2_DEPTH, mode=Mode.SUBTRACT)

    # Croquis4 → Cortar-Extruir3 (cut)
    with BuildSketch(Plane(origin=(0, -53.057975795, 0), x_dir=(1, 0, 0), z_dir=(0, 1, 0))):
        with Locations((54.698959583, 3.5)):
            Circle(CROQUIS4_R)
        with Locations((66.698959583, 3.5)):
            Circle(CROQUIS4_R)
    extrude(amount=-CORTAR_EXTRUIR3_DEPTH, mode=Mode.SUBTRACT)


solid = part.part
